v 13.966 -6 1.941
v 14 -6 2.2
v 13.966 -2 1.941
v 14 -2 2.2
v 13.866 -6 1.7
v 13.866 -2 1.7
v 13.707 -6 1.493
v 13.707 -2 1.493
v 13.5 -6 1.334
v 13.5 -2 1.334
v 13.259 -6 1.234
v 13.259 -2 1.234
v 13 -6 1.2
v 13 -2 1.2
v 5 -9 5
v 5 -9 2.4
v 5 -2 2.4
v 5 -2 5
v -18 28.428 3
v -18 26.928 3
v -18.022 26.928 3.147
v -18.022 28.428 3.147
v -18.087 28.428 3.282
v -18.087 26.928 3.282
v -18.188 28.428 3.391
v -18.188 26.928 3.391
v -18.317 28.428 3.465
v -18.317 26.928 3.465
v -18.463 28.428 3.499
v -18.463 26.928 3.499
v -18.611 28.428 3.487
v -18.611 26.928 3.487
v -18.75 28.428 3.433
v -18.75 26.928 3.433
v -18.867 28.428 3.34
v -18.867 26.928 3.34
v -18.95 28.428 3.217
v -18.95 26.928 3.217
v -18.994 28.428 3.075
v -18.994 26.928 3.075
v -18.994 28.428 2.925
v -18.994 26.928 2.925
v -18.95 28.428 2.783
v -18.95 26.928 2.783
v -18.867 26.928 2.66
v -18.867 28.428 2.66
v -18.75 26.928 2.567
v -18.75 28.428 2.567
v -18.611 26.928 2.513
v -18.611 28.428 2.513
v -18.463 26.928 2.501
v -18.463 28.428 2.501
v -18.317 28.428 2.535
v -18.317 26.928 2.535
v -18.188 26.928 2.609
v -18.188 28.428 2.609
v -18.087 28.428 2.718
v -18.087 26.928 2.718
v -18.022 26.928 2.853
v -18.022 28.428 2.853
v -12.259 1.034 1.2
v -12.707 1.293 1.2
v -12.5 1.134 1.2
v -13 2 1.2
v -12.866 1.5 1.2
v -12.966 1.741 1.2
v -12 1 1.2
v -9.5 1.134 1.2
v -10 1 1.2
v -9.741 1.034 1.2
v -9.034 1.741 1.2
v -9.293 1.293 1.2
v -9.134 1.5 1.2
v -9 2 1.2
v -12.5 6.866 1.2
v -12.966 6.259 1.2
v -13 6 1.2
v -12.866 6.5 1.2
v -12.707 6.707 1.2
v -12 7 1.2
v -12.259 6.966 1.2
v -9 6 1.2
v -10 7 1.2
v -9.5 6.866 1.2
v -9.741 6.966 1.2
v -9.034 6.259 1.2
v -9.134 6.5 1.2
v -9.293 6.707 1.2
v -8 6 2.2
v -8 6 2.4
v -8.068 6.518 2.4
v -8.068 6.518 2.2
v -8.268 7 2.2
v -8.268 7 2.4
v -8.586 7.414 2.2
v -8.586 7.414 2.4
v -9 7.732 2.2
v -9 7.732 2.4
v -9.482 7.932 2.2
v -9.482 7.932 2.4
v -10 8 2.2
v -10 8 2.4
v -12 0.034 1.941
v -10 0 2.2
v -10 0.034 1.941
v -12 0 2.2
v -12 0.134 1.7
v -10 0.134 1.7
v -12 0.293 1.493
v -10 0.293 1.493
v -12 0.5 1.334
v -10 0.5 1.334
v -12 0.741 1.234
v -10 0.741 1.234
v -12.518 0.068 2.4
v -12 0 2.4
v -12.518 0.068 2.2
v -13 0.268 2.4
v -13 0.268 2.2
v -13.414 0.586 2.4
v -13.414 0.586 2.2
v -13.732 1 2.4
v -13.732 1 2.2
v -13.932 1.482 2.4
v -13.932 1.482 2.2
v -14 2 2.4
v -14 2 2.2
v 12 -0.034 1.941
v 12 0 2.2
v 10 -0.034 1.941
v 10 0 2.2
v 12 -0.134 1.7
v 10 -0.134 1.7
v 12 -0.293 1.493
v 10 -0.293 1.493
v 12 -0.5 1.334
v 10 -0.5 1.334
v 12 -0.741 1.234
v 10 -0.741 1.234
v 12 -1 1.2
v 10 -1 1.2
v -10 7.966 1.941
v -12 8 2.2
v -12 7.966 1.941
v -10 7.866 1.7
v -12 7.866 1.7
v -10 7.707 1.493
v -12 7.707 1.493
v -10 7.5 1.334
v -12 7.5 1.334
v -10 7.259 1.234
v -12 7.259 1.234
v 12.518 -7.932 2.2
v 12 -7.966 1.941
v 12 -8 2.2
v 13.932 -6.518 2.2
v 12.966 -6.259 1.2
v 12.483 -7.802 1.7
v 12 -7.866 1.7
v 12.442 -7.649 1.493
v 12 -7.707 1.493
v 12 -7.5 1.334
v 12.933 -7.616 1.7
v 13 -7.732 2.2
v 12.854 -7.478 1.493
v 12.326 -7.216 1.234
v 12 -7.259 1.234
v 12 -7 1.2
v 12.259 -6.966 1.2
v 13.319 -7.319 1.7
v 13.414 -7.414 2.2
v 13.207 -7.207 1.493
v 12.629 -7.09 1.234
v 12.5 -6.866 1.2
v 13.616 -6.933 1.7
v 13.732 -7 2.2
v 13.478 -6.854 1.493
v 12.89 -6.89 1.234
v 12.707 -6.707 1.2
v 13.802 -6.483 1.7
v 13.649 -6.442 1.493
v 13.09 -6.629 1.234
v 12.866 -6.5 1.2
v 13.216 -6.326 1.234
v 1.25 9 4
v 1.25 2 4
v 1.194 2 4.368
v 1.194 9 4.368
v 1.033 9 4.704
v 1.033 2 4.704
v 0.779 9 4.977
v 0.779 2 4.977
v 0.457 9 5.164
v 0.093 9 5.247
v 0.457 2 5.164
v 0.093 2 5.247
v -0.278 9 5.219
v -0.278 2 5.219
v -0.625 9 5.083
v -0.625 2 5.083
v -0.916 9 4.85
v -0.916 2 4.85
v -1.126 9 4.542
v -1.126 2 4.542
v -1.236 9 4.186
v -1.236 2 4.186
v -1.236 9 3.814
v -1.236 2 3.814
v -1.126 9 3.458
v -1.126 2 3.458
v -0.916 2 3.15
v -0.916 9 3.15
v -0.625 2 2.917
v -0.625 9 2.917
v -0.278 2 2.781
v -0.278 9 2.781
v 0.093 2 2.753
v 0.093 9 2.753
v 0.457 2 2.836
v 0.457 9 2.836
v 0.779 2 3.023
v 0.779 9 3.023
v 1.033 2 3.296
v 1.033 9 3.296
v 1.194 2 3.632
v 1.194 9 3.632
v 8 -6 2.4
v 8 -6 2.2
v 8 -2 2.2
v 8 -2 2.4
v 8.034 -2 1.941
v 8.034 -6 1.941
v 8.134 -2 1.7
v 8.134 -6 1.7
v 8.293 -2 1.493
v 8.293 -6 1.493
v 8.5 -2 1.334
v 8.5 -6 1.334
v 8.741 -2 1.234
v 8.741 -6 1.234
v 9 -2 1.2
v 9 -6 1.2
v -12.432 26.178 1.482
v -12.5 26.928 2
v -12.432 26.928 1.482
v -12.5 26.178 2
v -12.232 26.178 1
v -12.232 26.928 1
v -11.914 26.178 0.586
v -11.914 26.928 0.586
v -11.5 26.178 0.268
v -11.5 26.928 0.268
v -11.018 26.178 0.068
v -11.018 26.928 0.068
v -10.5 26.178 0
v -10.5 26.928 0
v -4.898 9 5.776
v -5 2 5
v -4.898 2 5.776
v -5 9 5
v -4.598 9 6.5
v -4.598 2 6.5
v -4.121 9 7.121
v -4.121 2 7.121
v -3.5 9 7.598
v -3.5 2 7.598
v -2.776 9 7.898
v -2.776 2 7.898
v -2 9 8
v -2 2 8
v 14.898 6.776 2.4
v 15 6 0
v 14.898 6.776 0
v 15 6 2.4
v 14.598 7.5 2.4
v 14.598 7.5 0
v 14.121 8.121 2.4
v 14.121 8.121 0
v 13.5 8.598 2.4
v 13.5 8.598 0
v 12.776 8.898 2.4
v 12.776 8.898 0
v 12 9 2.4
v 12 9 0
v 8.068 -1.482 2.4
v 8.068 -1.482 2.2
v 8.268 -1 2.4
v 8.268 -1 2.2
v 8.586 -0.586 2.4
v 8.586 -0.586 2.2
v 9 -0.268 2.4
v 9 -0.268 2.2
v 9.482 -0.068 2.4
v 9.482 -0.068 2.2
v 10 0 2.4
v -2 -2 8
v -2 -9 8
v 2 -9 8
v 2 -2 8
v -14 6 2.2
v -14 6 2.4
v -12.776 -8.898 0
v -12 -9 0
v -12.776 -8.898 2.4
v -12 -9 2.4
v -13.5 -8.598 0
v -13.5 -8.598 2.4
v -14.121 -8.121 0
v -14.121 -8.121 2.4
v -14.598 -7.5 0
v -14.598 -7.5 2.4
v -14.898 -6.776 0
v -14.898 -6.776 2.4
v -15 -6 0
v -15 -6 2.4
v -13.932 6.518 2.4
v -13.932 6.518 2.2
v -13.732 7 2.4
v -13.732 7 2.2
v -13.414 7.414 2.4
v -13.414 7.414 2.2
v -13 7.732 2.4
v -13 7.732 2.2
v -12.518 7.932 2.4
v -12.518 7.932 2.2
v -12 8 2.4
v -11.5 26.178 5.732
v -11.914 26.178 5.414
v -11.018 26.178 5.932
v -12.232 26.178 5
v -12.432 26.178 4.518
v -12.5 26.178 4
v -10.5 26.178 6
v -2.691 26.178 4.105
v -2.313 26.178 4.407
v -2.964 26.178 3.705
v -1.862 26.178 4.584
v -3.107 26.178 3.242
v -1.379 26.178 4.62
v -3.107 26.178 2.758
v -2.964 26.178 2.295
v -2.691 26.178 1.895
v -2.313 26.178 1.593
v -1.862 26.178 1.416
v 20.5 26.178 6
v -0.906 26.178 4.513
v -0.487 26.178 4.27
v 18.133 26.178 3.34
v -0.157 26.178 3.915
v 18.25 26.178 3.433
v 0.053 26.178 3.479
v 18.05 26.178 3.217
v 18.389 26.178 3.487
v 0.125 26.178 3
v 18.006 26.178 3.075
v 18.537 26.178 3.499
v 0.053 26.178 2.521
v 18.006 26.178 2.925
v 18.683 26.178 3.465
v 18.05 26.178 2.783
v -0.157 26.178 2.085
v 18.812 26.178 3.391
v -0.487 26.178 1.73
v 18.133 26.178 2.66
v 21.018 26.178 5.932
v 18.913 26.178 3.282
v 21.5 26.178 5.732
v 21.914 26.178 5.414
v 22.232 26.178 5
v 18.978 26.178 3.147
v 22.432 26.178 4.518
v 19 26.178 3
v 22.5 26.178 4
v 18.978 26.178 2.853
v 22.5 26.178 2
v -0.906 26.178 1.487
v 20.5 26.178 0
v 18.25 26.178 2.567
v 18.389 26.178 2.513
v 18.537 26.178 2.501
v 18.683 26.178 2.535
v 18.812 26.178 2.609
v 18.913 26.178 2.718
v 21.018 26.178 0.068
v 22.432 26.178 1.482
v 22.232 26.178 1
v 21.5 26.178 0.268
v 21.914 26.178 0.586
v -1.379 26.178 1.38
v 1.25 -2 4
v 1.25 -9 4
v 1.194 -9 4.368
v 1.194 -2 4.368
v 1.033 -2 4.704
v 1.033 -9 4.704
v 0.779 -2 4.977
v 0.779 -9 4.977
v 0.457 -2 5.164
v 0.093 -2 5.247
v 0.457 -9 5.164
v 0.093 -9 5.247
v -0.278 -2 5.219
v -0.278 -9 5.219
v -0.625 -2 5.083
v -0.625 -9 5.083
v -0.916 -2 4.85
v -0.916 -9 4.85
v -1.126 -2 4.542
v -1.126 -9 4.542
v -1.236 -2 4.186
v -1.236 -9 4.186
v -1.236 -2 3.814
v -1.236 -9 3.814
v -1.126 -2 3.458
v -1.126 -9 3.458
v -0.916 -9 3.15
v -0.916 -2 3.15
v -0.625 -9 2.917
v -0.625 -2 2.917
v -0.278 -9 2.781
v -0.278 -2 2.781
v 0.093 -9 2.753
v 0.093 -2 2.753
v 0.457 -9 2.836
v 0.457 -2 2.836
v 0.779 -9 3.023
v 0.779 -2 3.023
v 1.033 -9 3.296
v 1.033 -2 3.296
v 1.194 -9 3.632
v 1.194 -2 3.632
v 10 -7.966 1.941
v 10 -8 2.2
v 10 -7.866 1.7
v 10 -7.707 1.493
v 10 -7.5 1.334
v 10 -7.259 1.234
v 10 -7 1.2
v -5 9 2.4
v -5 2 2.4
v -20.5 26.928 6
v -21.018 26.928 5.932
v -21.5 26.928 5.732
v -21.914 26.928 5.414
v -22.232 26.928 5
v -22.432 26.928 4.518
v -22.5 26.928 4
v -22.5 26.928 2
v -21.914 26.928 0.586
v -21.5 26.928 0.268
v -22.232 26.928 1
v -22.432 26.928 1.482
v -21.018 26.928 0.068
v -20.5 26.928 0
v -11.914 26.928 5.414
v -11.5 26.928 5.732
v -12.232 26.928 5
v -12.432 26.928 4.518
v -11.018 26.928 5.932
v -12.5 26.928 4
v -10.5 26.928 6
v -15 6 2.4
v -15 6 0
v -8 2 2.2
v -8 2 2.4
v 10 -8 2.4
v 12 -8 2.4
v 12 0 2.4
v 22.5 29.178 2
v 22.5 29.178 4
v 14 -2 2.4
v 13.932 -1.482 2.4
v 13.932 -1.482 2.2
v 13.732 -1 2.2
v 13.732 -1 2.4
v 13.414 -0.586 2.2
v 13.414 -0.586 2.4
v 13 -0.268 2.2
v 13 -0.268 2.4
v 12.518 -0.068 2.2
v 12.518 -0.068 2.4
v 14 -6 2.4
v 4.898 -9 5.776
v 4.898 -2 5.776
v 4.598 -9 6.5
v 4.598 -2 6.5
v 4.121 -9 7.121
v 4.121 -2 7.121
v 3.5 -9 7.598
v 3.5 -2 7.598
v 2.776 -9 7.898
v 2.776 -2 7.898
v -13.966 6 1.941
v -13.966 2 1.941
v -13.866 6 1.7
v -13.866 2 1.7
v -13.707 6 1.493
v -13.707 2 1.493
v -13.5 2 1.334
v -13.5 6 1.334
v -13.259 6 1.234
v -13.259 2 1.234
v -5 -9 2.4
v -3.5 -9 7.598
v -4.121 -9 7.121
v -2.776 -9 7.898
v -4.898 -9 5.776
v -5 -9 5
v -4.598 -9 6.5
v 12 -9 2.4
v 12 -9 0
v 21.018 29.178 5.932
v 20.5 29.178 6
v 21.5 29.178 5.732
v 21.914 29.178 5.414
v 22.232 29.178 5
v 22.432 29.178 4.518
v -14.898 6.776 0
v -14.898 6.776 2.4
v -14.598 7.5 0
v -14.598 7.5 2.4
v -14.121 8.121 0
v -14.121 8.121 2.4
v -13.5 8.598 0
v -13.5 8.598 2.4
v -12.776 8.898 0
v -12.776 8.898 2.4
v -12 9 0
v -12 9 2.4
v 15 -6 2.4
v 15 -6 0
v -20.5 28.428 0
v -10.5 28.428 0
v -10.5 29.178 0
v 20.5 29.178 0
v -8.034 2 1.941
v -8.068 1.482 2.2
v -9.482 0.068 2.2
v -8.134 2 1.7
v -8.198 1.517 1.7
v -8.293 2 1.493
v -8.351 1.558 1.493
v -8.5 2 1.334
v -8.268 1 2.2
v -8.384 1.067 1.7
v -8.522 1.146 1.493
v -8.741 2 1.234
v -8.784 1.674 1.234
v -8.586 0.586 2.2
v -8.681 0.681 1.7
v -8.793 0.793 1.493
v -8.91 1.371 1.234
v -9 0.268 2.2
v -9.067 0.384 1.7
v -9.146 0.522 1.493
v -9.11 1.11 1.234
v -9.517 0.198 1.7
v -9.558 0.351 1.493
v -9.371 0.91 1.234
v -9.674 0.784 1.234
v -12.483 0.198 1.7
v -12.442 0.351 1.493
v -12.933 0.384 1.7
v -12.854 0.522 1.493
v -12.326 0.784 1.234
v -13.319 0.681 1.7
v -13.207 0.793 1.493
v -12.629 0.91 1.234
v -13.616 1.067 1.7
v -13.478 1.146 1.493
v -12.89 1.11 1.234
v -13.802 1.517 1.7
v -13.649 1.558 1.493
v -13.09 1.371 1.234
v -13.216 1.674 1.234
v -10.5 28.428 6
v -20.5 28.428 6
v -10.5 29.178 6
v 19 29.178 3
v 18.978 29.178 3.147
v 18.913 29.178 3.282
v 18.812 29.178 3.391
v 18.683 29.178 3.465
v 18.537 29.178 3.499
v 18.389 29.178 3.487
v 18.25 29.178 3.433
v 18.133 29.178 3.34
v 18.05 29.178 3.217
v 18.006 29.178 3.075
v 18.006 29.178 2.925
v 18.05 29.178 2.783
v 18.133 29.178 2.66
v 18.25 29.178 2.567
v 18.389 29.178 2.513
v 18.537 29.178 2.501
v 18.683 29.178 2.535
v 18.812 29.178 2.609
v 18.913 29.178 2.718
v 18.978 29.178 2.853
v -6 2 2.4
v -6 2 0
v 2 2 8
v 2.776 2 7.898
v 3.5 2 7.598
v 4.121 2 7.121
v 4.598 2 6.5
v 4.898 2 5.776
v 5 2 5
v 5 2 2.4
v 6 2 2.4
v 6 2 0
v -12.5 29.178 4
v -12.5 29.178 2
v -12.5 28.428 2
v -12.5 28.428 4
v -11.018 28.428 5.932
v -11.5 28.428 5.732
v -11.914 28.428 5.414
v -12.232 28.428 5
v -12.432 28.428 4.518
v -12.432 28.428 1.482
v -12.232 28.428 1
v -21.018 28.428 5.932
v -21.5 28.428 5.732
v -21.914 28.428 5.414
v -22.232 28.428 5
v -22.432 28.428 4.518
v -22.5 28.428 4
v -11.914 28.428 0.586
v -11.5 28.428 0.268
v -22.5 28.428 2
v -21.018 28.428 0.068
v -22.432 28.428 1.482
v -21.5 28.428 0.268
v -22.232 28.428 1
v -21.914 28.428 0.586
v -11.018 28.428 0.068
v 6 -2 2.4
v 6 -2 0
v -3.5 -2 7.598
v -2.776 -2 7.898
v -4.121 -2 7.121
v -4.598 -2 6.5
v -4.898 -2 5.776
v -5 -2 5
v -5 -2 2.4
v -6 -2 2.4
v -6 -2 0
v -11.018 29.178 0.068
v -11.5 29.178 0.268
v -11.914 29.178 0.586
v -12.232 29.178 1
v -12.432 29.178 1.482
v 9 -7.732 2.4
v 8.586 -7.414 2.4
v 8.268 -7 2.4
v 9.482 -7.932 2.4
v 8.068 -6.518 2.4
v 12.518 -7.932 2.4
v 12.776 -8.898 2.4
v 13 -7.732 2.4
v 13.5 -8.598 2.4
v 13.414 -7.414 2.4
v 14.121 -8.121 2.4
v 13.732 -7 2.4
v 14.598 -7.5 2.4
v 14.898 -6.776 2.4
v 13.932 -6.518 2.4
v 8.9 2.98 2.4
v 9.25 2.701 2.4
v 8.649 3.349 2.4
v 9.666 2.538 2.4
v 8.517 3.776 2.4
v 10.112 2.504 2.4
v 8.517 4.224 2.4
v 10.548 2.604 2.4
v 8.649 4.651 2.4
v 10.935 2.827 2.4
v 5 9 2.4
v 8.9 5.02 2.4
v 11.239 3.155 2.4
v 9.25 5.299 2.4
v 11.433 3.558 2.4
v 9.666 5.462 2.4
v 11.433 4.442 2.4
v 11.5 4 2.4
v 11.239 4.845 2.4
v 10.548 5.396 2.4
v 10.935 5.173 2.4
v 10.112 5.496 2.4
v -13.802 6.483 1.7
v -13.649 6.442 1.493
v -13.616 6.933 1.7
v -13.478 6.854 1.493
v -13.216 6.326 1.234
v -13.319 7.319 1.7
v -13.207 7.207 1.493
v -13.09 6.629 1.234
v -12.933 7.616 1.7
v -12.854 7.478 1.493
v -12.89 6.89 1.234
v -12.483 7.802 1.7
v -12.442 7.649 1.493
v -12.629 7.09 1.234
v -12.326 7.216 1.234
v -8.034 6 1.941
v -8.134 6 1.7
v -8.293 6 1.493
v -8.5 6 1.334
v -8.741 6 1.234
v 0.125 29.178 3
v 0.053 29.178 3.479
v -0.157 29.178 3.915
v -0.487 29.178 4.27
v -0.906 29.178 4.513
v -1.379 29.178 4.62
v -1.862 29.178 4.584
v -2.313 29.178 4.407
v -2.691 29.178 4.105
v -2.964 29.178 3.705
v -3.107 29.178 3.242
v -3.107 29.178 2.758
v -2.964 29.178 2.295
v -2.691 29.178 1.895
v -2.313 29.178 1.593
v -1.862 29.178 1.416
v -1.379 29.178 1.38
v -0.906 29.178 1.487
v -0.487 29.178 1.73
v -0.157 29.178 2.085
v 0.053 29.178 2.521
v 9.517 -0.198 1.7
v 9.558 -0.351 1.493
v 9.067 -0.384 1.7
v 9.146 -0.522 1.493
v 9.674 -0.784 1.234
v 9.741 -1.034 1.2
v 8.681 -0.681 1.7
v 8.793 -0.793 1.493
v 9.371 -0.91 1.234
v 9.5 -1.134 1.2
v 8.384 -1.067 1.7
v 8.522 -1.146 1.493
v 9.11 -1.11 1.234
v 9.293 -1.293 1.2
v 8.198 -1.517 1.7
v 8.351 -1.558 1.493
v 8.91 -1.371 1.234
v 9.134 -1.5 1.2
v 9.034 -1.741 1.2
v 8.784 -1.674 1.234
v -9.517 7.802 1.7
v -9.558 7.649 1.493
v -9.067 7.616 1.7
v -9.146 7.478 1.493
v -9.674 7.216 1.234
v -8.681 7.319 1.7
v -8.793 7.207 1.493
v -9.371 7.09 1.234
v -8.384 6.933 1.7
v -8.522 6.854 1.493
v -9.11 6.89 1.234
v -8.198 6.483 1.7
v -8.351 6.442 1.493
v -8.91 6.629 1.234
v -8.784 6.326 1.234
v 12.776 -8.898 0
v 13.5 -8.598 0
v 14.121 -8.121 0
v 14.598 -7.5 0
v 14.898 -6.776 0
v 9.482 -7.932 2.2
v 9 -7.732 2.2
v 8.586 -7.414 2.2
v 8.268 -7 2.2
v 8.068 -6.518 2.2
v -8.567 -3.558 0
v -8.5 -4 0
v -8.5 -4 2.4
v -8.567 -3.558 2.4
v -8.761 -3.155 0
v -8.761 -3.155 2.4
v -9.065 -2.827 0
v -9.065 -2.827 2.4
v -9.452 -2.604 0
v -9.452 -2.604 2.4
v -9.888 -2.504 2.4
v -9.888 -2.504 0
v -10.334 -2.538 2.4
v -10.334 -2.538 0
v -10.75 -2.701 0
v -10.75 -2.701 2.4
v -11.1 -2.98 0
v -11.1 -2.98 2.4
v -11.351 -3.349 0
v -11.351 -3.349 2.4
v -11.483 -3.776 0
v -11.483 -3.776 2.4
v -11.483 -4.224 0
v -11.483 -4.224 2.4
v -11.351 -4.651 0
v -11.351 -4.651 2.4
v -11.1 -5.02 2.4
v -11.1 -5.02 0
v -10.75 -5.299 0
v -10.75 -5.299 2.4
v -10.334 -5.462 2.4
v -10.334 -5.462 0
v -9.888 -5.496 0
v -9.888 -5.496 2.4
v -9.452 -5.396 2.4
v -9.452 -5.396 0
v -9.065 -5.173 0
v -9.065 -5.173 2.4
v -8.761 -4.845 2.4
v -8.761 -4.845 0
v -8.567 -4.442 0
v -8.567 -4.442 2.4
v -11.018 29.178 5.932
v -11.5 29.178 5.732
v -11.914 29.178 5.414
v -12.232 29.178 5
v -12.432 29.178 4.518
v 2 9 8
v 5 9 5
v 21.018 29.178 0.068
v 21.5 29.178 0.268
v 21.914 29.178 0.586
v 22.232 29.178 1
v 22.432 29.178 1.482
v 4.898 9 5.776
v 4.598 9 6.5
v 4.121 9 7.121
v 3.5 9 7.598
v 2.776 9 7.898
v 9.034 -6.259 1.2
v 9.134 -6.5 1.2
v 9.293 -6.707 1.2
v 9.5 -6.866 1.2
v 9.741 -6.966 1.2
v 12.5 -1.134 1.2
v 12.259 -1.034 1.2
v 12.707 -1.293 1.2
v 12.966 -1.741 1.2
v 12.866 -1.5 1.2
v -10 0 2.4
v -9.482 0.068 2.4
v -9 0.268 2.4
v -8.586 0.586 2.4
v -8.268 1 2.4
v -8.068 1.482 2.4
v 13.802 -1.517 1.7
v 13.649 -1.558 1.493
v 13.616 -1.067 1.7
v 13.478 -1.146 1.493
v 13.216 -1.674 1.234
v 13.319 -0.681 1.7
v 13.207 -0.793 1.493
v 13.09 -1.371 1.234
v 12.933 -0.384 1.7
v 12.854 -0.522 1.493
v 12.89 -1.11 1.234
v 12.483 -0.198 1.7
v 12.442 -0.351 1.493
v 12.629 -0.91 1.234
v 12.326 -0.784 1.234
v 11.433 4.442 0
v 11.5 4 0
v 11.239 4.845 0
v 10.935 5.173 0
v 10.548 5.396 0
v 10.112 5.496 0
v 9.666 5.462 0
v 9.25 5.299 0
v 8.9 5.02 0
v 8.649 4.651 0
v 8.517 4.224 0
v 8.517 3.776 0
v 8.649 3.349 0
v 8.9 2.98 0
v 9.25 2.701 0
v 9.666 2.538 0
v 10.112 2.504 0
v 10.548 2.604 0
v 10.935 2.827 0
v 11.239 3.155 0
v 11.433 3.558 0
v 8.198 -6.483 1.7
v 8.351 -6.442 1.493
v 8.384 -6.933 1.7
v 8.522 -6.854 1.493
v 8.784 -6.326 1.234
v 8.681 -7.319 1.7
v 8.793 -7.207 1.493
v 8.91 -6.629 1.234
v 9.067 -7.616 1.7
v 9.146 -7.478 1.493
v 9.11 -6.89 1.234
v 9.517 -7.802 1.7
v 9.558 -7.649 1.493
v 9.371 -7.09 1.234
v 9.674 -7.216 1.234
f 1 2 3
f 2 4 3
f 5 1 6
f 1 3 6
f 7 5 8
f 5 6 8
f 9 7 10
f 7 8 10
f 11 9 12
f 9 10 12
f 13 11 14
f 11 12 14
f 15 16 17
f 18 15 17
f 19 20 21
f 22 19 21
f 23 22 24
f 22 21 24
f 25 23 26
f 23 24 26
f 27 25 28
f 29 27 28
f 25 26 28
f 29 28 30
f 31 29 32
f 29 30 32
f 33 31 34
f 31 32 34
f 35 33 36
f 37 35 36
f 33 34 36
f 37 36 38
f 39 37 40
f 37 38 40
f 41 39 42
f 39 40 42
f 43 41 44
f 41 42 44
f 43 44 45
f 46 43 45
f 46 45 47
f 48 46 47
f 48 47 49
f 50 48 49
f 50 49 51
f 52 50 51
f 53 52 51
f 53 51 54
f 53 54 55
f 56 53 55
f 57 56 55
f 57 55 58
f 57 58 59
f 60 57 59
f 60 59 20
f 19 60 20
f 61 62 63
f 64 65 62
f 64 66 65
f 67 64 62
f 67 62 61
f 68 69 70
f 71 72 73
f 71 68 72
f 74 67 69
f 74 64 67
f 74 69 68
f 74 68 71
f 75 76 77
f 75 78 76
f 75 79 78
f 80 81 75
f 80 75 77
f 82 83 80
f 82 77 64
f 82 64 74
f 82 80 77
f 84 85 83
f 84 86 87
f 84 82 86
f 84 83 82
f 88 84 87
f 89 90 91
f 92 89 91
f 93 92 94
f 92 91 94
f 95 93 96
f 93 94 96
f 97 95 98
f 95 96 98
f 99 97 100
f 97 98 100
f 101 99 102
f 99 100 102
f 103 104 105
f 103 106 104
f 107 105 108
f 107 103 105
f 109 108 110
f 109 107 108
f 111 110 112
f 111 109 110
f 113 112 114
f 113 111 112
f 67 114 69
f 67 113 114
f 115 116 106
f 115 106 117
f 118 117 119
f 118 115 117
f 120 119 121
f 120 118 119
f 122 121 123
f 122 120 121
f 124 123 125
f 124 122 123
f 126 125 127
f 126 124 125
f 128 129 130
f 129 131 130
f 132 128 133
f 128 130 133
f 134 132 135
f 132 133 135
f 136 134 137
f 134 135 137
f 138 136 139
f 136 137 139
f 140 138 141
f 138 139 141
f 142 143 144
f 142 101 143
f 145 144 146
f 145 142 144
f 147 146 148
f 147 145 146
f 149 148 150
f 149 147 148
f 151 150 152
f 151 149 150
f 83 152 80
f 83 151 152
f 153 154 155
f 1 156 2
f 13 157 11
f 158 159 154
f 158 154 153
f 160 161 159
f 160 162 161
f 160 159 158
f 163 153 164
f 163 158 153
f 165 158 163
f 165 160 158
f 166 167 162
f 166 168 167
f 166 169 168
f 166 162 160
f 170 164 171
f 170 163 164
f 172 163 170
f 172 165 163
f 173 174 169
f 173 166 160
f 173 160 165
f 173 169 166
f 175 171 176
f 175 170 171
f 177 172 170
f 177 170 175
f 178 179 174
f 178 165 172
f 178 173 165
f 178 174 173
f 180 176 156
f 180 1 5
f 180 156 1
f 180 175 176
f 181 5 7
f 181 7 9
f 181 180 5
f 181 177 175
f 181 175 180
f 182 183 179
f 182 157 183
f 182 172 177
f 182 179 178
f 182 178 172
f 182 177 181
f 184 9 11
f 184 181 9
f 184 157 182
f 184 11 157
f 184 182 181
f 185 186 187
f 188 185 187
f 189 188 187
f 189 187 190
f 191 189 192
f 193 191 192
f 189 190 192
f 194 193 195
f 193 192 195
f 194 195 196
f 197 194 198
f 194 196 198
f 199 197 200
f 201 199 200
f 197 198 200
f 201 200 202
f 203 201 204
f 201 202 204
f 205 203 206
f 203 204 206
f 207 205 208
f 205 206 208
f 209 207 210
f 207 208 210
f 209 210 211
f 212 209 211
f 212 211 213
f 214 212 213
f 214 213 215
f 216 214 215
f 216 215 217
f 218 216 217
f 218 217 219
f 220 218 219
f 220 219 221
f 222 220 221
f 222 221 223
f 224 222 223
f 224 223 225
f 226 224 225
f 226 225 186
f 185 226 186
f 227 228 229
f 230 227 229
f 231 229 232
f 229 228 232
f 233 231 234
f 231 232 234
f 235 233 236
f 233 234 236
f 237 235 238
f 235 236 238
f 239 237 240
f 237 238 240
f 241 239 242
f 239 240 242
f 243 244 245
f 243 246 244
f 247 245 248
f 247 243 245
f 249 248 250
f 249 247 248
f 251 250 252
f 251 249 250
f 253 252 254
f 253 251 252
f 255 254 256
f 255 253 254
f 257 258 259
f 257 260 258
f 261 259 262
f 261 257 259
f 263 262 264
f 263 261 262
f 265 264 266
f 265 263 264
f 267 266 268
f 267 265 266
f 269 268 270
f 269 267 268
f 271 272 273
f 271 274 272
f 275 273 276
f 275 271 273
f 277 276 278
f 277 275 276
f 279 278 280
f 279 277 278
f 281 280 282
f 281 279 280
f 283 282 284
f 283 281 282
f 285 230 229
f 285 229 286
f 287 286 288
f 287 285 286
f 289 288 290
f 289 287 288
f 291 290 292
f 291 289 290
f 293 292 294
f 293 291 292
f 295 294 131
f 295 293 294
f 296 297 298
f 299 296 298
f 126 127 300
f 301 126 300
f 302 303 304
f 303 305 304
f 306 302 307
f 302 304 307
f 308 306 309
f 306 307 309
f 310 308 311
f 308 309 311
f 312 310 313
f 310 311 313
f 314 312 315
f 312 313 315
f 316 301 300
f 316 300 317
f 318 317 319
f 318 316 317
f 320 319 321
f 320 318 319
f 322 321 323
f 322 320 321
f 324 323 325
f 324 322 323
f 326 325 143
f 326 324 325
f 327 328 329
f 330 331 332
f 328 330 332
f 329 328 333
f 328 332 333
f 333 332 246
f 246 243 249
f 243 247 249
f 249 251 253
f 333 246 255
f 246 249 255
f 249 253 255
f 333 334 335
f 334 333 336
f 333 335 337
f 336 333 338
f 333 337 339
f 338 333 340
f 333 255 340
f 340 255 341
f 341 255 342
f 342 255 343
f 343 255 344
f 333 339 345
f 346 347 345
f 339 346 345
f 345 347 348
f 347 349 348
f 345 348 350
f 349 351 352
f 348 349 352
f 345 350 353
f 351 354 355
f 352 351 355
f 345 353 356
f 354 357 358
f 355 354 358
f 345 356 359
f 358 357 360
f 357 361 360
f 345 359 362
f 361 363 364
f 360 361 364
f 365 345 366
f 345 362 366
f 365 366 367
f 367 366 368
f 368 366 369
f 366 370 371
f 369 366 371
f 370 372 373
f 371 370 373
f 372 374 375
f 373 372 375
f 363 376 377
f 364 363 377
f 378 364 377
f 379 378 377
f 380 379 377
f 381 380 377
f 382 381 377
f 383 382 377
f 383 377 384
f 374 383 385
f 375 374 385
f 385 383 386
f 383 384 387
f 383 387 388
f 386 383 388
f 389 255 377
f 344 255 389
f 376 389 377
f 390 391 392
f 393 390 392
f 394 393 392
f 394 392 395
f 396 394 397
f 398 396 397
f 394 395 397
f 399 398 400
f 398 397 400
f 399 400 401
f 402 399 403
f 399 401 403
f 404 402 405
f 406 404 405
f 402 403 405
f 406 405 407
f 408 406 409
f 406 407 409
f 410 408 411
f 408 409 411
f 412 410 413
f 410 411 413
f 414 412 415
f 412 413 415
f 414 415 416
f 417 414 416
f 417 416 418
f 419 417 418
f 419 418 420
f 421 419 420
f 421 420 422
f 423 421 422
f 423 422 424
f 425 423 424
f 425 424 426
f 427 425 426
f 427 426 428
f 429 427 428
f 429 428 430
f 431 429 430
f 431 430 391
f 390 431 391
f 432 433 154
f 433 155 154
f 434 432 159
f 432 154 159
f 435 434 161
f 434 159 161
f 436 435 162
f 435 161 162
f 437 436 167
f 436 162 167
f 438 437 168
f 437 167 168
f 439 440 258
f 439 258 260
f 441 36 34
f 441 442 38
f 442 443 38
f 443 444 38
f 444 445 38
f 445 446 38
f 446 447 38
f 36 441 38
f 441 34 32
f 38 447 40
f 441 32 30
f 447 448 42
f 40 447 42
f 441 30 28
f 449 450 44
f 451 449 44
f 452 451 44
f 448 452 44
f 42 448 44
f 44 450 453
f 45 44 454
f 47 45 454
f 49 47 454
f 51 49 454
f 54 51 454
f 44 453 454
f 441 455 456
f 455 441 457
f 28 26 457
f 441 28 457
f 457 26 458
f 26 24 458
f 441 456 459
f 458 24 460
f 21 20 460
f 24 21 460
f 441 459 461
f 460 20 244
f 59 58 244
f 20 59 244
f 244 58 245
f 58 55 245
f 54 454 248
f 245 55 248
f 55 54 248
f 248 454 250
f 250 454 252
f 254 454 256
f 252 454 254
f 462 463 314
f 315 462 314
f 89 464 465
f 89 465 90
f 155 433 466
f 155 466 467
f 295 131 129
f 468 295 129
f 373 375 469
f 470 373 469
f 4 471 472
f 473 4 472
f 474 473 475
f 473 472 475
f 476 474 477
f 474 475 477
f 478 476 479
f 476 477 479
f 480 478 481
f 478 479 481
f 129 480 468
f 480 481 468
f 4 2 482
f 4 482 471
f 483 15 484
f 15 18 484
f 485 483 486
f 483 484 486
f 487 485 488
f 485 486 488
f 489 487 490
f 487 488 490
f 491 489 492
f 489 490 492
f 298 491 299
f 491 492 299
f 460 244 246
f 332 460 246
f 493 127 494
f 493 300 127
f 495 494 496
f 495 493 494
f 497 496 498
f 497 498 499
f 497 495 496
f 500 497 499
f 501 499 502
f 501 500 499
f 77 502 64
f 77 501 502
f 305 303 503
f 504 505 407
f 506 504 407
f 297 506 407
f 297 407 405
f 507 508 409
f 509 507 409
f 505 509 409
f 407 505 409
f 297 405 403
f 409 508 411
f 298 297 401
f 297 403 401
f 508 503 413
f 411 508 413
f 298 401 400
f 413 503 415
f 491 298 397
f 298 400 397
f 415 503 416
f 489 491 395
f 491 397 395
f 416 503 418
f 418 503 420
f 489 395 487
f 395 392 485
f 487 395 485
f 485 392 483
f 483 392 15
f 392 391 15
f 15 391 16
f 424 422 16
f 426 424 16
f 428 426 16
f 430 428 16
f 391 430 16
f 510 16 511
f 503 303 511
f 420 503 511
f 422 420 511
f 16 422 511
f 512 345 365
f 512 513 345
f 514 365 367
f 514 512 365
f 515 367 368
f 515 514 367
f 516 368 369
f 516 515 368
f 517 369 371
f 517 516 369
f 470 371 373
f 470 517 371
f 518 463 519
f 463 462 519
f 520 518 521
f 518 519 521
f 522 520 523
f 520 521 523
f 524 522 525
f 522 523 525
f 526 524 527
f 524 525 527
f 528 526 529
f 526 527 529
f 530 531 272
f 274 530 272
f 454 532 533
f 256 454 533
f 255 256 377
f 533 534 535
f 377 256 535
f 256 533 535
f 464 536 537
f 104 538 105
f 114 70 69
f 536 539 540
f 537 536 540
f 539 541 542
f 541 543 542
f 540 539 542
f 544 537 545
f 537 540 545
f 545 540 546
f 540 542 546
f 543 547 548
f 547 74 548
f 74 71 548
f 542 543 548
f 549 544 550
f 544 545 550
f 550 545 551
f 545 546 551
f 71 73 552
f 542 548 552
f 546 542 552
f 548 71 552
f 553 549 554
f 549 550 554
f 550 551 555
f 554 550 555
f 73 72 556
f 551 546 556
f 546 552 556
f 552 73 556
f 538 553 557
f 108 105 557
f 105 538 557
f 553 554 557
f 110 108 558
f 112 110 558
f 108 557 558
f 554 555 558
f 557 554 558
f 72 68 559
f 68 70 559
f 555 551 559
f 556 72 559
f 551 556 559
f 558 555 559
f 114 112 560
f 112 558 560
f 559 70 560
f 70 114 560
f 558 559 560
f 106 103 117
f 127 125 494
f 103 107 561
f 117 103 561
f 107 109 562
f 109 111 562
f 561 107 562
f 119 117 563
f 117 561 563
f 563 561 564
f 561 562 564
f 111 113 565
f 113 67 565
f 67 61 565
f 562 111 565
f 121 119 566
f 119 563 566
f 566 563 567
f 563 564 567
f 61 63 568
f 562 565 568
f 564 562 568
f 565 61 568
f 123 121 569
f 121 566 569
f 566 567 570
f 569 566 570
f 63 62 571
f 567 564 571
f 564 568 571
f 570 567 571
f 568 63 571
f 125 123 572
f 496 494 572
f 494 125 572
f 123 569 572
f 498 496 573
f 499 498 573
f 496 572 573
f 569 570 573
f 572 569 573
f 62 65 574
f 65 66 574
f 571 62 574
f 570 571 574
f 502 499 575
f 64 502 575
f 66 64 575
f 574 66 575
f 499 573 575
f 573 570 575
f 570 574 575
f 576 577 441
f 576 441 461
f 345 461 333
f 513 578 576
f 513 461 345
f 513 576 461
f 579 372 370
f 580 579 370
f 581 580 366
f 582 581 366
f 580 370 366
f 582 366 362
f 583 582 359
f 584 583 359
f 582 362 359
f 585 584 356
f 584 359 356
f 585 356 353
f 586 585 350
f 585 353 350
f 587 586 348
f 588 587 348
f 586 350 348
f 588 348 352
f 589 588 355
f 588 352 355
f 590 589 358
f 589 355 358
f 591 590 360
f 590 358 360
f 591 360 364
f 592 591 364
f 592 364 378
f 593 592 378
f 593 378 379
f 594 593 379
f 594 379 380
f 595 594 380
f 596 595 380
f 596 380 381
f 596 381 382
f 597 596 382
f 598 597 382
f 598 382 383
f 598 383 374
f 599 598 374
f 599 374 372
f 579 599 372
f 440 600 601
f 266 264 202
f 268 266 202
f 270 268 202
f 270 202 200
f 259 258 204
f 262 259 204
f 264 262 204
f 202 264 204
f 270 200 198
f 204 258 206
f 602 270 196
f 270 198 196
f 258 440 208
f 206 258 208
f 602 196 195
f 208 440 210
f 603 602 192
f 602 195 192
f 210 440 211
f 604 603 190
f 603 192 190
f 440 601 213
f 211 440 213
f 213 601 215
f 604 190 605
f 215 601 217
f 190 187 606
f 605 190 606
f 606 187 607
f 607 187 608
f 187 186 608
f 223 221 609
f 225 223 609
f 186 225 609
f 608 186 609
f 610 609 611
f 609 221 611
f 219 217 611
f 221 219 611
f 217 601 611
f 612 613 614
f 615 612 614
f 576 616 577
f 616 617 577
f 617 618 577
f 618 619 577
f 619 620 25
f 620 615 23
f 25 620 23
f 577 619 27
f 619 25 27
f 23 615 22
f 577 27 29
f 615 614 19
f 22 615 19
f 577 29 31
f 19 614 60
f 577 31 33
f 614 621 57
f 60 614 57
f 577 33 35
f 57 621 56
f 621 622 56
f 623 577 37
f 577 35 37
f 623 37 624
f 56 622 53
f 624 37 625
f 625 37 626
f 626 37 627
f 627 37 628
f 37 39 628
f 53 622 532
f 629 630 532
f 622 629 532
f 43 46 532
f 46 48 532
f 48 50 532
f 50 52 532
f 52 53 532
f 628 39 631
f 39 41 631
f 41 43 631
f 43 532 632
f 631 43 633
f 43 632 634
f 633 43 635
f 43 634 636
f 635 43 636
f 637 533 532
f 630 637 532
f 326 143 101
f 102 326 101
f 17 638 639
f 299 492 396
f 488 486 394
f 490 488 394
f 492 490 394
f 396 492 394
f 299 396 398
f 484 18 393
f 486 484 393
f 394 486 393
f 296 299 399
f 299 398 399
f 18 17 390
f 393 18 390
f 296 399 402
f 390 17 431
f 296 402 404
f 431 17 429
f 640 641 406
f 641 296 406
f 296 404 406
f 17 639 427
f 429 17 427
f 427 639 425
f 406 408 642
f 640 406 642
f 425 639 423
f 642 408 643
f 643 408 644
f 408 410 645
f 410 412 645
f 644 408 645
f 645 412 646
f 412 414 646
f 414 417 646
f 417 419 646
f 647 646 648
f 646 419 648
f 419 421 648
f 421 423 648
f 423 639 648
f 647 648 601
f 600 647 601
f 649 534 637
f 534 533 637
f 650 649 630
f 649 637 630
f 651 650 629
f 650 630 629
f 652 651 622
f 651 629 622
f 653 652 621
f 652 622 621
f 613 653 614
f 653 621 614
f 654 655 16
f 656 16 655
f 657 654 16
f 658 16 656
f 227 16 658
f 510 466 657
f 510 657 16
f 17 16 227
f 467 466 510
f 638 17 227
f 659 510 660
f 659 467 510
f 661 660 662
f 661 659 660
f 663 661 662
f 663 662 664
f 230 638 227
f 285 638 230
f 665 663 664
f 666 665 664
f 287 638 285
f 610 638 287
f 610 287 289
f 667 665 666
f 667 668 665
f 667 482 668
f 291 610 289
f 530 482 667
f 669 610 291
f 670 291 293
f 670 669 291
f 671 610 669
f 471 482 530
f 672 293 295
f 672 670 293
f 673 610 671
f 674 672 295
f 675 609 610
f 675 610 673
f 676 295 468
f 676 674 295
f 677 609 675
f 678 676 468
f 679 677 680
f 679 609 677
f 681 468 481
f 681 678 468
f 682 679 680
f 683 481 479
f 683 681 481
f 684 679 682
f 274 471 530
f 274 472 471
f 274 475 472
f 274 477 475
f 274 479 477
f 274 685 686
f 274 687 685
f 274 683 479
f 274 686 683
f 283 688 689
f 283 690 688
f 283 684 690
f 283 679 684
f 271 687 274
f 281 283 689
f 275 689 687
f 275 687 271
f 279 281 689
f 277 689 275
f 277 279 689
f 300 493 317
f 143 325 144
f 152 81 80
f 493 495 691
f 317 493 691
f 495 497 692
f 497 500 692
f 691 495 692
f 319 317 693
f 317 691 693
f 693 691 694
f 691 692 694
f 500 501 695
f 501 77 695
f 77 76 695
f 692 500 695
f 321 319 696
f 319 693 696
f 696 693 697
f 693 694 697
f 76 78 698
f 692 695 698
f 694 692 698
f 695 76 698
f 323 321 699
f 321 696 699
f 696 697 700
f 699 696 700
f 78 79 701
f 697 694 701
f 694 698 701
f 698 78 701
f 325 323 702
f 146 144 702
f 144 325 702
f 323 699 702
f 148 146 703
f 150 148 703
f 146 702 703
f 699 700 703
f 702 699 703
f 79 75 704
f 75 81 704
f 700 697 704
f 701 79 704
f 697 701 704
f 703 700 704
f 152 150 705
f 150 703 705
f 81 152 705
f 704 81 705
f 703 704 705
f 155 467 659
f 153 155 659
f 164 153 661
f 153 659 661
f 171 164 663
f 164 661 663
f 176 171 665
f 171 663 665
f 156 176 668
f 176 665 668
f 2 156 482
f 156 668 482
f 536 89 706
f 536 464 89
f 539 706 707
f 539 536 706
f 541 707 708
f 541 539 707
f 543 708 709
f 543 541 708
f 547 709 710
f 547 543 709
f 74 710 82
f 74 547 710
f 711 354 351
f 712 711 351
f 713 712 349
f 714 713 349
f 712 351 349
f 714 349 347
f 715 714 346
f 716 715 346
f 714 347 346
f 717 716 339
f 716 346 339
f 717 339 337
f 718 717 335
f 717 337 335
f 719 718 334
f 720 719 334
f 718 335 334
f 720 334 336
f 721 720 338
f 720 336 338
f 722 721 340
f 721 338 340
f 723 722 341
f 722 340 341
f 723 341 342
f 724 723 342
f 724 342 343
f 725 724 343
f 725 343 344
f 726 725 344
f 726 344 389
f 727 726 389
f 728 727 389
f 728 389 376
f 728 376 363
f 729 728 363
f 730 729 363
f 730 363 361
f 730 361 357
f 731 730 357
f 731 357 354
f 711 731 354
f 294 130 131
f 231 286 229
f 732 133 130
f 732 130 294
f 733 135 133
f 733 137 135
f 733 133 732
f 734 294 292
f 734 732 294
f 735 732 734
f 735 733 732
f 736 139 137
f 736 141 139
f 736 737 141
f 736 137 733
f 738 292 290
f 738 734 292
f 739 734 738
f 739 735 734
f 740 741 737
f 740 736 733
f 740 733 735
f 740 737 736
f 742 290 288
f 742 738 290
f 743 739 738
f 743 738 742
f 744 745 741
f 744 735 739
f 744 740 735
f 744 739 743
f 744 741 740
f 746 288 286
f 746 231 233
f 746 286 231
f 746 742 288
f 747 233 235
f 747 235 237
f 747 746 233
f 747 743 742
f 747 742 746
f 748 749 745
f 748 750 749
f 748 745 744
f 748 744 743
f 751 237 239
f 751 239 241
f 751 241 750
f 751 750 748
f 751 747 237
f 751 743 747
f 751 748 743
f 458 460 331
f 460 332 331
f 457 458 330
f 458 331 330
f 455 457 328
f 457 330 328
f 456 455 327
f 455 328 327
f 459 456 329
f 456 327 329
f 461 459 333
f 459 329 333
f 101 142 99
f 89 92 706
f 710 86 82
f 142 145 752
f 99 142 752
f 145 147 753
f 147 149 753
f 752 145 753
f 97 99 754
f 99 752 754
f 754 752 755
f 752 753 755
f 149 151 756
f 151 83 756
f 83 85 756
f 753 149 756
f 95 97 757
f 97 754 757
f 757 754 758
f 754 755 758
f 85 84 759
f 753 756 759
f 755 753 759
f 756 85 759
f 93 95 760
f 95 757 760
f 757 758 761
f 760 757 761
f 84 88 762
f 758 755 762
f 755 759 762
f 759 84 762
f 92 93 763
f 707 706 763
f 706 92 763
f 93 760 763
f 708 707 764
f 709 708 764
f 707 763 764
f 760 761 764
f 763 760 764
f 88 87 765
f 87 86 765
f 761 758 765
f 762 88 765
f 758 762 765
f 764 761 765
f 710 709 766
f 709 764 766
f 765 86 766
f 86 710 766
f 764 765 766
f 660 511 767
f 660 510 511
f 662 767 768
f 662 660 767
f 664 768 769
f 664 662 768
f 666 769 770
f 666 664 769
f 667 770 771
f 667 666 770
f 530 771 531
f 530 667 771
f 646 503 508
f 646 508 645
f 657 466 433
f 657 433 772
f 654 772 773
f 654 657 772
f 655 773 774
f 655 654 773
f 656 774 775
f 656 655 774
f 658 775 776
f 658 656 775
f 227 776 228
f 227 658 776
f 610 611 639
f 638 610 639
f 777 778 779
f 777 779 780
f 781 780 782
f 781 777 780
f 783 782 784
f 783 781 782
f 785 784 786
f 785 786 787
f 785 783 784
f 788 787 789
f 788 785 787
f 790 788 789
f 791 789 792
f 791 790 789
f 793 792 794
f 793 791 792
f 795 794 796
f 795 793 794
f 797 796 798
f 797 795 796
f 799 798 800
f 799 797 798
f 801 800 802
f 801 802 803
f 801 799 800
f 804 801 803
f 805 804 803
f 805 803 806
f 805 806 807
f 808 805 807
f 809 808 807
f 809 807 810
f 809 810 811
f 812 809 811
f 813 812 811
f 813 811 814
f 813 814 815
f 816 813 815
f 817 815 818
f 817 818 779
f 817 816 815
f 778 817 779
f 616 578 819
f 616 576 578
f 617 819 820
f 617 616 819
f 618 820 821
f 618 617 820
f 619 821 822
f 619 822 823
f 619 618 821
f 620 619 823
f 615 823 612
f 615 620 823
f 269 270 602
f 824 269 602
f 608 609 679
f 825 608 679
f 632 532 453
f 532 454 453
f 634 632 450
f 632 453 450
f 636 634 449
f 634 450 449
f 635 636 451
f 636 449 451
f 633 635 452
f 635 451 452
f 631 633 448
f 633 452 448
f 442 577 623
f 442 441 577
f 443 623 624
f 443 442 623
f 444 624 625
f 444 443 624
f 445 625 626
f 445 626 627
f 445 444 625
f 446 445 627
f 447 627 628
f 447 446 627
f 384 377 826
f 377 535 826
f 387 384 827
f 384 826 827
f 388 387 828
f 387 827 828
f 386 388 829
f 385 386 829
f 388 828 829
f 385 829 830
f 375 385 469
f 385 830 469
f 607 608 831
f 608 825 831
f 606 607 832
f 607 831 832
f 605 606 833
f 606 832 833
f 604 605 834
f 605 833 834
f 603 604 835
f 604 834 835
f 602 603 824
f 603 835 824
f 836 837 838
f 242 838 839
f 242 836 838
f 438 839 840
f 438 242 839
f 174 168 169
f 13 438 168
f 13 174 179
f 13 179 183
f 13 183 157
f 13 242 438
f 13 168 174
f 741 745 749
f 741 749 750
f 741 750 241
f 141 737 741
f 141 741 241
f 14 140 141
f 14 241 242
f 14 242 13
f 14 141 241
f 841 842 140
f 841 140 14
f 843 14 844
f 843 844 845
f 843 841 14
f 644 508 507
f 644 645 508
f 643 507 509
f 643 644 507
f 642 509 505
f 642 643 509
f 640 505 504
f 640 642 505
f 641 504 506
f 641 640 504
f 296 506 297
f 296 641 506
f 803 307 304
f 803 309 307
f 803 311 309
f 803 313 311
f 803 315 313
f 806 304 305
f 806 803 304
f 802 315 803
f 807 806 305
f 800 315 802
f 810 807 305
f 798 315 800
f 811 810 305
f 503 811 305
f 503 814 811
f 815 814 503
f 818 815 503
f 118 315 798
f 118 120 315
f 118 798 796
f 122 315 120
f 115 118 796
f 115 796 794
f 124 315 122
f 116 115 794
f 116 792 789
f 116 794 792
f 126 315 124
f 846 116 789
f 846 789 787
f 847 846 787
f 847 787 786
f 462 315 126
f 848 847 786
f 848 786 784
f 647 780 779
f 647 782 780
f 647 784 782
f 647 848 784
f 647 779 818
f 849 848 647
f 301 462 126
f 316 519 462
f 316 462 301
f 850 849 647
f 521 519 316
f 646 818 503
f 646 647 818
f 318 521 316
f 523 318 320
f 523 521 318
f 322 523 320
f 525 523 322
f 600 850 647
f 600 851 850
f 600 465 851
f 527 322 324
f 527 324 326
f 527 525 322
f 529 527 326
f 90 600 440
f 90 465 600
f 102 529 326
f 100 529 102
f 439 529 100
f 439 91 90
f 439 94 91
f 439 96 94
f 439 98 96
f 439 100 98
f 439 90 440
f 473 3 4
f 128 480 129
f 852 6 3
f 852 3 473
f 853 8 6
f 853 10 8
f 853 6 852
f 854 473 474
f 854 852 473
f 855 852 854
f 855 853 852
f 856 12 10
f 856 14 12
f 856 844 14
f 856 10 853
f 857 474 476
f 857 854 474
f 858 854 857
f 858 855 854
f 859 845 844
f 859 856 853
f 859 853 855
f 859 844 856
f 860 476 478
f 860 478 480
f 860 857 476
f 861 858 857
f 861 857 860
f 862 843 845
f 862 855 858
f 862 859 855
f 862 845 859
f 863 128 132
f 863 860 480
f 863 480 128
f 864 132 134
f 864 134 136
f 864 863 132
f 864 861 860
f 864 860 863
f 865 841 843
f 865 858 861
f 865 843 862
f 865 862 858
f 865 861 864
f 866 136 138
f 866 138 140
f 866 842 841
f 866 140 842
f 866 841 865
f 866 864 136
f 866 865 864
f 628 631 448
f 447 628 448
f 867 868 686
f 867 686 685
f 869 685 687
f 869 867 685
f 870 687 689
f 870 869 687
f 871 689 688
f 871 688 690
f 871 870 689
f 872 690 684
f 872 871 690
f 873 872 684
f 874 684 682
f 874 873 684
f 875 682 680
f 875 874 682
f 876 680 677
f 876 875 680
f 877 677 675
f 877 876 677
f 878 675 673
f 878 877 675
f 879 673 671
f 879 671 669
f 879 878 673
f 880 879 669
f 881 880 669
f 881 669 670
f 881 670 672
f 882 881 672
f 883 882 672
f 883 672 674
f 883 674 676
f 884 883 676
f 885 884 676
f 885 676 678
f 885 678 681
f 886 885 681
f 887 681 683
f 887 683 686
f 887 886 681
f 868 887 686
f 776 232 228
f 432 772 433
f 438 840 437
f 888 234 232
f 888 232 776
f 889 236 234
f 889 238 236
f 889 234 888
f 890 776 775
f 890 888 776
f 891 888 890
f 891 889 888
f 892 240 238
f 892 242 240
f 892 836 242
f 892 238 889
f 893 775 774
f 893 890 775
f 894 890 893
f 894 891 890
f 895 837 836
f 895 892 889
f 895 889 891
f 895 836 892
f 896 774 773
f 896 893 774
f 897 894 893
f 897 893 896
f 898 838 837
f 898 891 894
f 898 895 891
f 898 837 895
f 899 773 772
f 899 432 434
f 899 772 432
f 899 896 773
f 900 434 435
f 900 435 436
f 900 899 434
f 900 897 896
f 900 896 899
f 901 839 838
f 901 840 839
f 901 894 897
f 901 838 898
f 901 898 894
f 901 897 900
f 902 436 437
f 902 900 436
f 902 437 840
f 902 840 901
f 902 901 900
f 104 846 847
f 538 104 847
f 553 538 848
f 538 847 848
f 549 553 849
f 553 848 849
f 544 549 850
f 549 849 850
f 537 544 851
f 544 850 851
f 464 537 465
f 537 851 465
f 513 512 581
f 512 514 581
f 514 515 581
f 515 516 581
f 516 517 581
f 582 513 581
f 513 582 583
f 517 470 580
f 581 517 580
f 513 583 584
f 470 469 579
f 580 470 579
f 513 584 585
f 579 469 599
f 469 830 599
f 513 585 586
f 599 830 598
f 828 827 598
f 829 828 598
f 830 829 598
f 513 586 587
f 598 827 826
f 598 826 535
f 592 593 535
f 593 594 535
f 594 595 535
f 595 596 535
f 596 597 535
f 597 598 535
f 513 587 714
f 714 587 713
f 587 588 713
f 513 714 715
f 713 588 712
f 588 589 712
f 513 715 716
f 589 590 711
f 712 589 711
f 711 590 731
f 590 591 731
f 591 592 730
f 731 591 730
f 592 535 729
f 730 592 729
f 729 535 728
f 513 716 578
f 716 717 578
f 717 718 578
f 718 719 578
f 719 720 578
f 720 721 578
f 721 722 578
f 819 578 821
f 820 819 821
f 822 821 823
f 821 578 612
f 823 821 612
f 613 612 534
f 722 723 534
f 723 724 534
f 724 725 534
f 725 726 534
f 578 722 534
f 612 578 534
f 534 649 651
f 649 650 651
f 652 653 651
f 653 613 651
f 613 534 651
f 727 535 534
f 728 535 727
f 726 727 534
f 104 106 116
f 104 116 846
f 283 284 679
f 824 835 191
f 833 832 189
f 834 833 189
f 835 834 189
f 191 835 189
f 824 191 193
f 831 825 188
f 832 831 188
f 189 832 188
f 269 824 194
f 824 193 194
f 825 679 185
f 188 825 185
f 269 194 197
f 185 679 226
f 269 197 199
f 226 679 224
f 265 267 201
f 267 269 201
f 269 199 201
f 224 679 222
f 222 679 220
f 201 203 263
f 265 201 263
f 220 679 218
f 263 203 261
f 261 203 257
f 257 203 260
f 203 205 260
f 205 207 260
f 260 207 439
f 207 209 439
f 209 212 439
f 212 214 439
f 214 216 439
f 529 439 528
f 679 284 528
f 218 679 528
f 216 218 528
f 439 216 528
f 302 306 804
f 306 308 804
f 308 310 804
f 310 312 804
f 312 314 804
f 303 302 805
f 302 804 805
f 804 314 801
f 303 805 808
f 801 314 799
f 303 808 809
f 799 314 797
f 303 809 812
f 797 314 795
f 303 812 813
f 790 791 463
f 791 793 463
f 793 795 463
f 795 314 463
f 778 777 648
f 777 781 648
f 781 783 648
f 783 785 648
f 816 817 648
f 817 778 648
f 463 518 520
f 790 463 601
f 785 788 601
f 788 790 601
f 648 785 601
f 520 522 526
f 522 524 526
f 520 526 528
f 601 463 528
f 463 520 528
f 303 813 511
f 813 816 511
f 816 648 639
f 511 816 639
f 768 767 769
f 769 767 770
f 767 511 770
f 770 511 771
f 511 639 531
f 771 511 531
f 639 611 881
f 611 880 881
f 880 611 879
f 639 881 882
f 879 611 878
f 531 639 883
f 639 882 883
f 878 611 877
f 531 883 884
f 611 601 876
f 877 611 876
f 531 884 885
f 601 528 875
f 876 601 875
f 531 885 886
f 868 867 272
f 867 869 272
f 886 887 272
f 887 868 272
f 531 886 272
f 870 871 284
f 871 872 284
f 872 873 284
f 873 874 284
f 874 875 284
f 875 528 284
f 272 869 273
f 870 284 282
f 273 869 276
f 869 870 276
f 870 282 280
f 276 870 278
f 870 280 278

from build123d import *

# Parameters (mm, degrees)
F0_W      = 10
F0_H      = 7
F0_R      = 1.5
F0_W_2    = 6
F0_H_2    = 8
F1_DEPTH  = 2.4
F2_DEPTH  = 8
F3_R      = 1.25
F4_DEPTH  = 25
F5_R      = 3
F6_DEPTH  = 1.2
F7_R      = 2
F8_R      = 1
F10_DEPTH = 6
F11_R     = 0.5
F12_DEPTH = 25
F13_R     = 1.625
F13_R_2   = 0.5
F14_DEPTH = 25
F15_R     = 2


with BuildPart() as f1:
    # F0 (on Top) → F1 (new body)
    with BuildSketch(Plane.XY):
        with Locations((0, 5.5)):
            Rectangle(F0_W, F0_H)
        Polygon((-5, 2), (-5, 9), (-15, 9), (-15, -9), (-5, -9), (-5, -2), (-6, -2), (-6, 2), align=None)
        with Locations((-10, -4)):
            Circle(F0_R, mode=Mode.SUBTRACT)
        with Locations((-11, 4)):
            Rectangle(F0_W_2, F0_H_2, mode=Mode.SUBTRACT)
        with Locations((0, -5.5)):
            Rectangle(F0_W, F0_H)
        Polygon((15, -9), (15, 9), (5, 9), (5, 2), (6, 2), (6, -2), (5, -2), (5, -9), align=None)
        with Locations((11, -4)):
            Rectangle(F0_W_2, F0_H_2, mode=Mode.SUBTRACT)
        with Locations((10, 4)):
            Circle(F0_R, mode=Mode.SUBTRACT)
    extrude(amount=F1_DEPTH)

    # F0 (on Top) → F2 (join)
    with BuildSketch(Plane.XY):
        with Locations((0, -5.5)):
            Rectangle(F0_W, F0_H)
        with Locations((0, 5.5)):
            Rectangle(F0_W, F0_H)
    extrude(amount=F2_DEPTH)

    # F3 (on face) → F4 (cut)
    with BuildSketch(Plane.XZ.offset(9)):
        with Locations((0, 4)):
            Circle(F3_R)
    extrude(amount=-F4_DEPTH, mode=Mode.SUBTRACT)

    # F5
    f5_edges = [f1.edges().sort_by_distance(p)[0] for p in [
        (-5, 5.5, 8),
        (5, 5.5, 8),
        (-5, -5.5, 8),
        (5, -5.5, 8),
        (-15, -9, 1.2),
        (15, -9, 1.2),
        (-15, 9, 1.2),
        (15, 9, 1.2),
    ]]
    fillet(f5_edges, radius=F5_R)

    # F0 (on Top) → F6 (join)
    with BuildSketch(Plane.XY):
        with Locations((-11, 4)):
            Rectangle(F0_W_2, F0_H_2)
        with Locations((11, -4)):
            Rectangle(F0_W_2, F0_H_2)
    extrude(amount=F6_DEPTH)

    # F7
    f7_edges = [f1.edges().sort_by_distance(p)[0] for p in [
        (14, -8, 1.8),
        (8, -8, 1.8),
        (14, 0, 1.8),
        (8, 0, 1.8),
        (-8, 8, 1.8),
        (-14, 8, 1.8),
        (-8, 0, 1.8),
        (-14, 0, 1.8),
    ]]
    fillet(f7_edges, radius=F7_R)

    # F8
    f8_edges = [f1.edges().sort_by_distance(p)[0] for p in [
        (-11, 8, 1.2),
        (-8.585786, 7.414214, 1.2),
        (-13.414214, 7.414214, 1.2),
        (-8, 4, 1.2),
        (-14, 4, 1.2),
        (-8.585786, 0.585786, 1.2),
        (-13.414214, 0.585786, 1.2),
        (-11, 0, 1.2),
        (11, -8, 1.2),
        (8.585786, -7.414214, 1.2),
        (13.414214, -7.414214, 1.2),
        (8, -4, 1.2),
        (14, -4, 1.2),
        (8.585786, -0.585786, 1.2),
        (13.414214, -0.585786, 1.2),
        (11, 0, 1.2),
    ]]
    fillet(f8_edges, radius=F8_R)


with BuildPart() as f10:
    # F9 (on Top) → F10 (new body)
    with BuildSketch(Plane.XY):
        Polygon((-12.5, 26.9275341481), (-12.5, 26.1775341481), (22.5, 26.1775341481), (22.5, 29.1775341481), (-12.5, 29.1775341481), (-12.5, 28.4275341481), (-22.5, 28.4275341481), (-22.5, 26.9275341481), align=None)
    extrude(amount=F10_DEPTH)

    # F11 (on face) → F12 (cut)
    with BuildSketch(Plane.XZ.offset(-26.9275341481)):
        with Locations((-18.5, 3)):
            Circle(F11_R)
    extrude(amount=-F12_DEPTH, mode=Mode.SUBTRACT)

    # F13 (on face) → F14 (cut)
    with BuildSketch(Plane.XZ.offset(-26.1775341481)):
        with Locations((-1.5, 3)):
            Circle(F13_R)
        with Locations((18.5, 3)):
            Circle(F13_R_2)
    extrude(amount=-F14_DEPTH, mode=Mode.SUBTRACT)

    # F15
    f15_edges = [f10.edges().sort_by_distance(p)[0] for p in [
        (-22.5, 27.677534, 6),
        (-22.5, 27.677534, 0),
        (22.5, 27.677534, 6),
        (22.5, 27.677534, 0),
        (-12.5, 26.552534, 0),
        (-12.5, 28.802534, 0),
        (-12.5, 26.552534, 6),
        (-12.5, 28.802534, 6),
    ]]
    fillet(f15_edges, radius=F15_R)


solid = Compound([f1.part, f10.part])
